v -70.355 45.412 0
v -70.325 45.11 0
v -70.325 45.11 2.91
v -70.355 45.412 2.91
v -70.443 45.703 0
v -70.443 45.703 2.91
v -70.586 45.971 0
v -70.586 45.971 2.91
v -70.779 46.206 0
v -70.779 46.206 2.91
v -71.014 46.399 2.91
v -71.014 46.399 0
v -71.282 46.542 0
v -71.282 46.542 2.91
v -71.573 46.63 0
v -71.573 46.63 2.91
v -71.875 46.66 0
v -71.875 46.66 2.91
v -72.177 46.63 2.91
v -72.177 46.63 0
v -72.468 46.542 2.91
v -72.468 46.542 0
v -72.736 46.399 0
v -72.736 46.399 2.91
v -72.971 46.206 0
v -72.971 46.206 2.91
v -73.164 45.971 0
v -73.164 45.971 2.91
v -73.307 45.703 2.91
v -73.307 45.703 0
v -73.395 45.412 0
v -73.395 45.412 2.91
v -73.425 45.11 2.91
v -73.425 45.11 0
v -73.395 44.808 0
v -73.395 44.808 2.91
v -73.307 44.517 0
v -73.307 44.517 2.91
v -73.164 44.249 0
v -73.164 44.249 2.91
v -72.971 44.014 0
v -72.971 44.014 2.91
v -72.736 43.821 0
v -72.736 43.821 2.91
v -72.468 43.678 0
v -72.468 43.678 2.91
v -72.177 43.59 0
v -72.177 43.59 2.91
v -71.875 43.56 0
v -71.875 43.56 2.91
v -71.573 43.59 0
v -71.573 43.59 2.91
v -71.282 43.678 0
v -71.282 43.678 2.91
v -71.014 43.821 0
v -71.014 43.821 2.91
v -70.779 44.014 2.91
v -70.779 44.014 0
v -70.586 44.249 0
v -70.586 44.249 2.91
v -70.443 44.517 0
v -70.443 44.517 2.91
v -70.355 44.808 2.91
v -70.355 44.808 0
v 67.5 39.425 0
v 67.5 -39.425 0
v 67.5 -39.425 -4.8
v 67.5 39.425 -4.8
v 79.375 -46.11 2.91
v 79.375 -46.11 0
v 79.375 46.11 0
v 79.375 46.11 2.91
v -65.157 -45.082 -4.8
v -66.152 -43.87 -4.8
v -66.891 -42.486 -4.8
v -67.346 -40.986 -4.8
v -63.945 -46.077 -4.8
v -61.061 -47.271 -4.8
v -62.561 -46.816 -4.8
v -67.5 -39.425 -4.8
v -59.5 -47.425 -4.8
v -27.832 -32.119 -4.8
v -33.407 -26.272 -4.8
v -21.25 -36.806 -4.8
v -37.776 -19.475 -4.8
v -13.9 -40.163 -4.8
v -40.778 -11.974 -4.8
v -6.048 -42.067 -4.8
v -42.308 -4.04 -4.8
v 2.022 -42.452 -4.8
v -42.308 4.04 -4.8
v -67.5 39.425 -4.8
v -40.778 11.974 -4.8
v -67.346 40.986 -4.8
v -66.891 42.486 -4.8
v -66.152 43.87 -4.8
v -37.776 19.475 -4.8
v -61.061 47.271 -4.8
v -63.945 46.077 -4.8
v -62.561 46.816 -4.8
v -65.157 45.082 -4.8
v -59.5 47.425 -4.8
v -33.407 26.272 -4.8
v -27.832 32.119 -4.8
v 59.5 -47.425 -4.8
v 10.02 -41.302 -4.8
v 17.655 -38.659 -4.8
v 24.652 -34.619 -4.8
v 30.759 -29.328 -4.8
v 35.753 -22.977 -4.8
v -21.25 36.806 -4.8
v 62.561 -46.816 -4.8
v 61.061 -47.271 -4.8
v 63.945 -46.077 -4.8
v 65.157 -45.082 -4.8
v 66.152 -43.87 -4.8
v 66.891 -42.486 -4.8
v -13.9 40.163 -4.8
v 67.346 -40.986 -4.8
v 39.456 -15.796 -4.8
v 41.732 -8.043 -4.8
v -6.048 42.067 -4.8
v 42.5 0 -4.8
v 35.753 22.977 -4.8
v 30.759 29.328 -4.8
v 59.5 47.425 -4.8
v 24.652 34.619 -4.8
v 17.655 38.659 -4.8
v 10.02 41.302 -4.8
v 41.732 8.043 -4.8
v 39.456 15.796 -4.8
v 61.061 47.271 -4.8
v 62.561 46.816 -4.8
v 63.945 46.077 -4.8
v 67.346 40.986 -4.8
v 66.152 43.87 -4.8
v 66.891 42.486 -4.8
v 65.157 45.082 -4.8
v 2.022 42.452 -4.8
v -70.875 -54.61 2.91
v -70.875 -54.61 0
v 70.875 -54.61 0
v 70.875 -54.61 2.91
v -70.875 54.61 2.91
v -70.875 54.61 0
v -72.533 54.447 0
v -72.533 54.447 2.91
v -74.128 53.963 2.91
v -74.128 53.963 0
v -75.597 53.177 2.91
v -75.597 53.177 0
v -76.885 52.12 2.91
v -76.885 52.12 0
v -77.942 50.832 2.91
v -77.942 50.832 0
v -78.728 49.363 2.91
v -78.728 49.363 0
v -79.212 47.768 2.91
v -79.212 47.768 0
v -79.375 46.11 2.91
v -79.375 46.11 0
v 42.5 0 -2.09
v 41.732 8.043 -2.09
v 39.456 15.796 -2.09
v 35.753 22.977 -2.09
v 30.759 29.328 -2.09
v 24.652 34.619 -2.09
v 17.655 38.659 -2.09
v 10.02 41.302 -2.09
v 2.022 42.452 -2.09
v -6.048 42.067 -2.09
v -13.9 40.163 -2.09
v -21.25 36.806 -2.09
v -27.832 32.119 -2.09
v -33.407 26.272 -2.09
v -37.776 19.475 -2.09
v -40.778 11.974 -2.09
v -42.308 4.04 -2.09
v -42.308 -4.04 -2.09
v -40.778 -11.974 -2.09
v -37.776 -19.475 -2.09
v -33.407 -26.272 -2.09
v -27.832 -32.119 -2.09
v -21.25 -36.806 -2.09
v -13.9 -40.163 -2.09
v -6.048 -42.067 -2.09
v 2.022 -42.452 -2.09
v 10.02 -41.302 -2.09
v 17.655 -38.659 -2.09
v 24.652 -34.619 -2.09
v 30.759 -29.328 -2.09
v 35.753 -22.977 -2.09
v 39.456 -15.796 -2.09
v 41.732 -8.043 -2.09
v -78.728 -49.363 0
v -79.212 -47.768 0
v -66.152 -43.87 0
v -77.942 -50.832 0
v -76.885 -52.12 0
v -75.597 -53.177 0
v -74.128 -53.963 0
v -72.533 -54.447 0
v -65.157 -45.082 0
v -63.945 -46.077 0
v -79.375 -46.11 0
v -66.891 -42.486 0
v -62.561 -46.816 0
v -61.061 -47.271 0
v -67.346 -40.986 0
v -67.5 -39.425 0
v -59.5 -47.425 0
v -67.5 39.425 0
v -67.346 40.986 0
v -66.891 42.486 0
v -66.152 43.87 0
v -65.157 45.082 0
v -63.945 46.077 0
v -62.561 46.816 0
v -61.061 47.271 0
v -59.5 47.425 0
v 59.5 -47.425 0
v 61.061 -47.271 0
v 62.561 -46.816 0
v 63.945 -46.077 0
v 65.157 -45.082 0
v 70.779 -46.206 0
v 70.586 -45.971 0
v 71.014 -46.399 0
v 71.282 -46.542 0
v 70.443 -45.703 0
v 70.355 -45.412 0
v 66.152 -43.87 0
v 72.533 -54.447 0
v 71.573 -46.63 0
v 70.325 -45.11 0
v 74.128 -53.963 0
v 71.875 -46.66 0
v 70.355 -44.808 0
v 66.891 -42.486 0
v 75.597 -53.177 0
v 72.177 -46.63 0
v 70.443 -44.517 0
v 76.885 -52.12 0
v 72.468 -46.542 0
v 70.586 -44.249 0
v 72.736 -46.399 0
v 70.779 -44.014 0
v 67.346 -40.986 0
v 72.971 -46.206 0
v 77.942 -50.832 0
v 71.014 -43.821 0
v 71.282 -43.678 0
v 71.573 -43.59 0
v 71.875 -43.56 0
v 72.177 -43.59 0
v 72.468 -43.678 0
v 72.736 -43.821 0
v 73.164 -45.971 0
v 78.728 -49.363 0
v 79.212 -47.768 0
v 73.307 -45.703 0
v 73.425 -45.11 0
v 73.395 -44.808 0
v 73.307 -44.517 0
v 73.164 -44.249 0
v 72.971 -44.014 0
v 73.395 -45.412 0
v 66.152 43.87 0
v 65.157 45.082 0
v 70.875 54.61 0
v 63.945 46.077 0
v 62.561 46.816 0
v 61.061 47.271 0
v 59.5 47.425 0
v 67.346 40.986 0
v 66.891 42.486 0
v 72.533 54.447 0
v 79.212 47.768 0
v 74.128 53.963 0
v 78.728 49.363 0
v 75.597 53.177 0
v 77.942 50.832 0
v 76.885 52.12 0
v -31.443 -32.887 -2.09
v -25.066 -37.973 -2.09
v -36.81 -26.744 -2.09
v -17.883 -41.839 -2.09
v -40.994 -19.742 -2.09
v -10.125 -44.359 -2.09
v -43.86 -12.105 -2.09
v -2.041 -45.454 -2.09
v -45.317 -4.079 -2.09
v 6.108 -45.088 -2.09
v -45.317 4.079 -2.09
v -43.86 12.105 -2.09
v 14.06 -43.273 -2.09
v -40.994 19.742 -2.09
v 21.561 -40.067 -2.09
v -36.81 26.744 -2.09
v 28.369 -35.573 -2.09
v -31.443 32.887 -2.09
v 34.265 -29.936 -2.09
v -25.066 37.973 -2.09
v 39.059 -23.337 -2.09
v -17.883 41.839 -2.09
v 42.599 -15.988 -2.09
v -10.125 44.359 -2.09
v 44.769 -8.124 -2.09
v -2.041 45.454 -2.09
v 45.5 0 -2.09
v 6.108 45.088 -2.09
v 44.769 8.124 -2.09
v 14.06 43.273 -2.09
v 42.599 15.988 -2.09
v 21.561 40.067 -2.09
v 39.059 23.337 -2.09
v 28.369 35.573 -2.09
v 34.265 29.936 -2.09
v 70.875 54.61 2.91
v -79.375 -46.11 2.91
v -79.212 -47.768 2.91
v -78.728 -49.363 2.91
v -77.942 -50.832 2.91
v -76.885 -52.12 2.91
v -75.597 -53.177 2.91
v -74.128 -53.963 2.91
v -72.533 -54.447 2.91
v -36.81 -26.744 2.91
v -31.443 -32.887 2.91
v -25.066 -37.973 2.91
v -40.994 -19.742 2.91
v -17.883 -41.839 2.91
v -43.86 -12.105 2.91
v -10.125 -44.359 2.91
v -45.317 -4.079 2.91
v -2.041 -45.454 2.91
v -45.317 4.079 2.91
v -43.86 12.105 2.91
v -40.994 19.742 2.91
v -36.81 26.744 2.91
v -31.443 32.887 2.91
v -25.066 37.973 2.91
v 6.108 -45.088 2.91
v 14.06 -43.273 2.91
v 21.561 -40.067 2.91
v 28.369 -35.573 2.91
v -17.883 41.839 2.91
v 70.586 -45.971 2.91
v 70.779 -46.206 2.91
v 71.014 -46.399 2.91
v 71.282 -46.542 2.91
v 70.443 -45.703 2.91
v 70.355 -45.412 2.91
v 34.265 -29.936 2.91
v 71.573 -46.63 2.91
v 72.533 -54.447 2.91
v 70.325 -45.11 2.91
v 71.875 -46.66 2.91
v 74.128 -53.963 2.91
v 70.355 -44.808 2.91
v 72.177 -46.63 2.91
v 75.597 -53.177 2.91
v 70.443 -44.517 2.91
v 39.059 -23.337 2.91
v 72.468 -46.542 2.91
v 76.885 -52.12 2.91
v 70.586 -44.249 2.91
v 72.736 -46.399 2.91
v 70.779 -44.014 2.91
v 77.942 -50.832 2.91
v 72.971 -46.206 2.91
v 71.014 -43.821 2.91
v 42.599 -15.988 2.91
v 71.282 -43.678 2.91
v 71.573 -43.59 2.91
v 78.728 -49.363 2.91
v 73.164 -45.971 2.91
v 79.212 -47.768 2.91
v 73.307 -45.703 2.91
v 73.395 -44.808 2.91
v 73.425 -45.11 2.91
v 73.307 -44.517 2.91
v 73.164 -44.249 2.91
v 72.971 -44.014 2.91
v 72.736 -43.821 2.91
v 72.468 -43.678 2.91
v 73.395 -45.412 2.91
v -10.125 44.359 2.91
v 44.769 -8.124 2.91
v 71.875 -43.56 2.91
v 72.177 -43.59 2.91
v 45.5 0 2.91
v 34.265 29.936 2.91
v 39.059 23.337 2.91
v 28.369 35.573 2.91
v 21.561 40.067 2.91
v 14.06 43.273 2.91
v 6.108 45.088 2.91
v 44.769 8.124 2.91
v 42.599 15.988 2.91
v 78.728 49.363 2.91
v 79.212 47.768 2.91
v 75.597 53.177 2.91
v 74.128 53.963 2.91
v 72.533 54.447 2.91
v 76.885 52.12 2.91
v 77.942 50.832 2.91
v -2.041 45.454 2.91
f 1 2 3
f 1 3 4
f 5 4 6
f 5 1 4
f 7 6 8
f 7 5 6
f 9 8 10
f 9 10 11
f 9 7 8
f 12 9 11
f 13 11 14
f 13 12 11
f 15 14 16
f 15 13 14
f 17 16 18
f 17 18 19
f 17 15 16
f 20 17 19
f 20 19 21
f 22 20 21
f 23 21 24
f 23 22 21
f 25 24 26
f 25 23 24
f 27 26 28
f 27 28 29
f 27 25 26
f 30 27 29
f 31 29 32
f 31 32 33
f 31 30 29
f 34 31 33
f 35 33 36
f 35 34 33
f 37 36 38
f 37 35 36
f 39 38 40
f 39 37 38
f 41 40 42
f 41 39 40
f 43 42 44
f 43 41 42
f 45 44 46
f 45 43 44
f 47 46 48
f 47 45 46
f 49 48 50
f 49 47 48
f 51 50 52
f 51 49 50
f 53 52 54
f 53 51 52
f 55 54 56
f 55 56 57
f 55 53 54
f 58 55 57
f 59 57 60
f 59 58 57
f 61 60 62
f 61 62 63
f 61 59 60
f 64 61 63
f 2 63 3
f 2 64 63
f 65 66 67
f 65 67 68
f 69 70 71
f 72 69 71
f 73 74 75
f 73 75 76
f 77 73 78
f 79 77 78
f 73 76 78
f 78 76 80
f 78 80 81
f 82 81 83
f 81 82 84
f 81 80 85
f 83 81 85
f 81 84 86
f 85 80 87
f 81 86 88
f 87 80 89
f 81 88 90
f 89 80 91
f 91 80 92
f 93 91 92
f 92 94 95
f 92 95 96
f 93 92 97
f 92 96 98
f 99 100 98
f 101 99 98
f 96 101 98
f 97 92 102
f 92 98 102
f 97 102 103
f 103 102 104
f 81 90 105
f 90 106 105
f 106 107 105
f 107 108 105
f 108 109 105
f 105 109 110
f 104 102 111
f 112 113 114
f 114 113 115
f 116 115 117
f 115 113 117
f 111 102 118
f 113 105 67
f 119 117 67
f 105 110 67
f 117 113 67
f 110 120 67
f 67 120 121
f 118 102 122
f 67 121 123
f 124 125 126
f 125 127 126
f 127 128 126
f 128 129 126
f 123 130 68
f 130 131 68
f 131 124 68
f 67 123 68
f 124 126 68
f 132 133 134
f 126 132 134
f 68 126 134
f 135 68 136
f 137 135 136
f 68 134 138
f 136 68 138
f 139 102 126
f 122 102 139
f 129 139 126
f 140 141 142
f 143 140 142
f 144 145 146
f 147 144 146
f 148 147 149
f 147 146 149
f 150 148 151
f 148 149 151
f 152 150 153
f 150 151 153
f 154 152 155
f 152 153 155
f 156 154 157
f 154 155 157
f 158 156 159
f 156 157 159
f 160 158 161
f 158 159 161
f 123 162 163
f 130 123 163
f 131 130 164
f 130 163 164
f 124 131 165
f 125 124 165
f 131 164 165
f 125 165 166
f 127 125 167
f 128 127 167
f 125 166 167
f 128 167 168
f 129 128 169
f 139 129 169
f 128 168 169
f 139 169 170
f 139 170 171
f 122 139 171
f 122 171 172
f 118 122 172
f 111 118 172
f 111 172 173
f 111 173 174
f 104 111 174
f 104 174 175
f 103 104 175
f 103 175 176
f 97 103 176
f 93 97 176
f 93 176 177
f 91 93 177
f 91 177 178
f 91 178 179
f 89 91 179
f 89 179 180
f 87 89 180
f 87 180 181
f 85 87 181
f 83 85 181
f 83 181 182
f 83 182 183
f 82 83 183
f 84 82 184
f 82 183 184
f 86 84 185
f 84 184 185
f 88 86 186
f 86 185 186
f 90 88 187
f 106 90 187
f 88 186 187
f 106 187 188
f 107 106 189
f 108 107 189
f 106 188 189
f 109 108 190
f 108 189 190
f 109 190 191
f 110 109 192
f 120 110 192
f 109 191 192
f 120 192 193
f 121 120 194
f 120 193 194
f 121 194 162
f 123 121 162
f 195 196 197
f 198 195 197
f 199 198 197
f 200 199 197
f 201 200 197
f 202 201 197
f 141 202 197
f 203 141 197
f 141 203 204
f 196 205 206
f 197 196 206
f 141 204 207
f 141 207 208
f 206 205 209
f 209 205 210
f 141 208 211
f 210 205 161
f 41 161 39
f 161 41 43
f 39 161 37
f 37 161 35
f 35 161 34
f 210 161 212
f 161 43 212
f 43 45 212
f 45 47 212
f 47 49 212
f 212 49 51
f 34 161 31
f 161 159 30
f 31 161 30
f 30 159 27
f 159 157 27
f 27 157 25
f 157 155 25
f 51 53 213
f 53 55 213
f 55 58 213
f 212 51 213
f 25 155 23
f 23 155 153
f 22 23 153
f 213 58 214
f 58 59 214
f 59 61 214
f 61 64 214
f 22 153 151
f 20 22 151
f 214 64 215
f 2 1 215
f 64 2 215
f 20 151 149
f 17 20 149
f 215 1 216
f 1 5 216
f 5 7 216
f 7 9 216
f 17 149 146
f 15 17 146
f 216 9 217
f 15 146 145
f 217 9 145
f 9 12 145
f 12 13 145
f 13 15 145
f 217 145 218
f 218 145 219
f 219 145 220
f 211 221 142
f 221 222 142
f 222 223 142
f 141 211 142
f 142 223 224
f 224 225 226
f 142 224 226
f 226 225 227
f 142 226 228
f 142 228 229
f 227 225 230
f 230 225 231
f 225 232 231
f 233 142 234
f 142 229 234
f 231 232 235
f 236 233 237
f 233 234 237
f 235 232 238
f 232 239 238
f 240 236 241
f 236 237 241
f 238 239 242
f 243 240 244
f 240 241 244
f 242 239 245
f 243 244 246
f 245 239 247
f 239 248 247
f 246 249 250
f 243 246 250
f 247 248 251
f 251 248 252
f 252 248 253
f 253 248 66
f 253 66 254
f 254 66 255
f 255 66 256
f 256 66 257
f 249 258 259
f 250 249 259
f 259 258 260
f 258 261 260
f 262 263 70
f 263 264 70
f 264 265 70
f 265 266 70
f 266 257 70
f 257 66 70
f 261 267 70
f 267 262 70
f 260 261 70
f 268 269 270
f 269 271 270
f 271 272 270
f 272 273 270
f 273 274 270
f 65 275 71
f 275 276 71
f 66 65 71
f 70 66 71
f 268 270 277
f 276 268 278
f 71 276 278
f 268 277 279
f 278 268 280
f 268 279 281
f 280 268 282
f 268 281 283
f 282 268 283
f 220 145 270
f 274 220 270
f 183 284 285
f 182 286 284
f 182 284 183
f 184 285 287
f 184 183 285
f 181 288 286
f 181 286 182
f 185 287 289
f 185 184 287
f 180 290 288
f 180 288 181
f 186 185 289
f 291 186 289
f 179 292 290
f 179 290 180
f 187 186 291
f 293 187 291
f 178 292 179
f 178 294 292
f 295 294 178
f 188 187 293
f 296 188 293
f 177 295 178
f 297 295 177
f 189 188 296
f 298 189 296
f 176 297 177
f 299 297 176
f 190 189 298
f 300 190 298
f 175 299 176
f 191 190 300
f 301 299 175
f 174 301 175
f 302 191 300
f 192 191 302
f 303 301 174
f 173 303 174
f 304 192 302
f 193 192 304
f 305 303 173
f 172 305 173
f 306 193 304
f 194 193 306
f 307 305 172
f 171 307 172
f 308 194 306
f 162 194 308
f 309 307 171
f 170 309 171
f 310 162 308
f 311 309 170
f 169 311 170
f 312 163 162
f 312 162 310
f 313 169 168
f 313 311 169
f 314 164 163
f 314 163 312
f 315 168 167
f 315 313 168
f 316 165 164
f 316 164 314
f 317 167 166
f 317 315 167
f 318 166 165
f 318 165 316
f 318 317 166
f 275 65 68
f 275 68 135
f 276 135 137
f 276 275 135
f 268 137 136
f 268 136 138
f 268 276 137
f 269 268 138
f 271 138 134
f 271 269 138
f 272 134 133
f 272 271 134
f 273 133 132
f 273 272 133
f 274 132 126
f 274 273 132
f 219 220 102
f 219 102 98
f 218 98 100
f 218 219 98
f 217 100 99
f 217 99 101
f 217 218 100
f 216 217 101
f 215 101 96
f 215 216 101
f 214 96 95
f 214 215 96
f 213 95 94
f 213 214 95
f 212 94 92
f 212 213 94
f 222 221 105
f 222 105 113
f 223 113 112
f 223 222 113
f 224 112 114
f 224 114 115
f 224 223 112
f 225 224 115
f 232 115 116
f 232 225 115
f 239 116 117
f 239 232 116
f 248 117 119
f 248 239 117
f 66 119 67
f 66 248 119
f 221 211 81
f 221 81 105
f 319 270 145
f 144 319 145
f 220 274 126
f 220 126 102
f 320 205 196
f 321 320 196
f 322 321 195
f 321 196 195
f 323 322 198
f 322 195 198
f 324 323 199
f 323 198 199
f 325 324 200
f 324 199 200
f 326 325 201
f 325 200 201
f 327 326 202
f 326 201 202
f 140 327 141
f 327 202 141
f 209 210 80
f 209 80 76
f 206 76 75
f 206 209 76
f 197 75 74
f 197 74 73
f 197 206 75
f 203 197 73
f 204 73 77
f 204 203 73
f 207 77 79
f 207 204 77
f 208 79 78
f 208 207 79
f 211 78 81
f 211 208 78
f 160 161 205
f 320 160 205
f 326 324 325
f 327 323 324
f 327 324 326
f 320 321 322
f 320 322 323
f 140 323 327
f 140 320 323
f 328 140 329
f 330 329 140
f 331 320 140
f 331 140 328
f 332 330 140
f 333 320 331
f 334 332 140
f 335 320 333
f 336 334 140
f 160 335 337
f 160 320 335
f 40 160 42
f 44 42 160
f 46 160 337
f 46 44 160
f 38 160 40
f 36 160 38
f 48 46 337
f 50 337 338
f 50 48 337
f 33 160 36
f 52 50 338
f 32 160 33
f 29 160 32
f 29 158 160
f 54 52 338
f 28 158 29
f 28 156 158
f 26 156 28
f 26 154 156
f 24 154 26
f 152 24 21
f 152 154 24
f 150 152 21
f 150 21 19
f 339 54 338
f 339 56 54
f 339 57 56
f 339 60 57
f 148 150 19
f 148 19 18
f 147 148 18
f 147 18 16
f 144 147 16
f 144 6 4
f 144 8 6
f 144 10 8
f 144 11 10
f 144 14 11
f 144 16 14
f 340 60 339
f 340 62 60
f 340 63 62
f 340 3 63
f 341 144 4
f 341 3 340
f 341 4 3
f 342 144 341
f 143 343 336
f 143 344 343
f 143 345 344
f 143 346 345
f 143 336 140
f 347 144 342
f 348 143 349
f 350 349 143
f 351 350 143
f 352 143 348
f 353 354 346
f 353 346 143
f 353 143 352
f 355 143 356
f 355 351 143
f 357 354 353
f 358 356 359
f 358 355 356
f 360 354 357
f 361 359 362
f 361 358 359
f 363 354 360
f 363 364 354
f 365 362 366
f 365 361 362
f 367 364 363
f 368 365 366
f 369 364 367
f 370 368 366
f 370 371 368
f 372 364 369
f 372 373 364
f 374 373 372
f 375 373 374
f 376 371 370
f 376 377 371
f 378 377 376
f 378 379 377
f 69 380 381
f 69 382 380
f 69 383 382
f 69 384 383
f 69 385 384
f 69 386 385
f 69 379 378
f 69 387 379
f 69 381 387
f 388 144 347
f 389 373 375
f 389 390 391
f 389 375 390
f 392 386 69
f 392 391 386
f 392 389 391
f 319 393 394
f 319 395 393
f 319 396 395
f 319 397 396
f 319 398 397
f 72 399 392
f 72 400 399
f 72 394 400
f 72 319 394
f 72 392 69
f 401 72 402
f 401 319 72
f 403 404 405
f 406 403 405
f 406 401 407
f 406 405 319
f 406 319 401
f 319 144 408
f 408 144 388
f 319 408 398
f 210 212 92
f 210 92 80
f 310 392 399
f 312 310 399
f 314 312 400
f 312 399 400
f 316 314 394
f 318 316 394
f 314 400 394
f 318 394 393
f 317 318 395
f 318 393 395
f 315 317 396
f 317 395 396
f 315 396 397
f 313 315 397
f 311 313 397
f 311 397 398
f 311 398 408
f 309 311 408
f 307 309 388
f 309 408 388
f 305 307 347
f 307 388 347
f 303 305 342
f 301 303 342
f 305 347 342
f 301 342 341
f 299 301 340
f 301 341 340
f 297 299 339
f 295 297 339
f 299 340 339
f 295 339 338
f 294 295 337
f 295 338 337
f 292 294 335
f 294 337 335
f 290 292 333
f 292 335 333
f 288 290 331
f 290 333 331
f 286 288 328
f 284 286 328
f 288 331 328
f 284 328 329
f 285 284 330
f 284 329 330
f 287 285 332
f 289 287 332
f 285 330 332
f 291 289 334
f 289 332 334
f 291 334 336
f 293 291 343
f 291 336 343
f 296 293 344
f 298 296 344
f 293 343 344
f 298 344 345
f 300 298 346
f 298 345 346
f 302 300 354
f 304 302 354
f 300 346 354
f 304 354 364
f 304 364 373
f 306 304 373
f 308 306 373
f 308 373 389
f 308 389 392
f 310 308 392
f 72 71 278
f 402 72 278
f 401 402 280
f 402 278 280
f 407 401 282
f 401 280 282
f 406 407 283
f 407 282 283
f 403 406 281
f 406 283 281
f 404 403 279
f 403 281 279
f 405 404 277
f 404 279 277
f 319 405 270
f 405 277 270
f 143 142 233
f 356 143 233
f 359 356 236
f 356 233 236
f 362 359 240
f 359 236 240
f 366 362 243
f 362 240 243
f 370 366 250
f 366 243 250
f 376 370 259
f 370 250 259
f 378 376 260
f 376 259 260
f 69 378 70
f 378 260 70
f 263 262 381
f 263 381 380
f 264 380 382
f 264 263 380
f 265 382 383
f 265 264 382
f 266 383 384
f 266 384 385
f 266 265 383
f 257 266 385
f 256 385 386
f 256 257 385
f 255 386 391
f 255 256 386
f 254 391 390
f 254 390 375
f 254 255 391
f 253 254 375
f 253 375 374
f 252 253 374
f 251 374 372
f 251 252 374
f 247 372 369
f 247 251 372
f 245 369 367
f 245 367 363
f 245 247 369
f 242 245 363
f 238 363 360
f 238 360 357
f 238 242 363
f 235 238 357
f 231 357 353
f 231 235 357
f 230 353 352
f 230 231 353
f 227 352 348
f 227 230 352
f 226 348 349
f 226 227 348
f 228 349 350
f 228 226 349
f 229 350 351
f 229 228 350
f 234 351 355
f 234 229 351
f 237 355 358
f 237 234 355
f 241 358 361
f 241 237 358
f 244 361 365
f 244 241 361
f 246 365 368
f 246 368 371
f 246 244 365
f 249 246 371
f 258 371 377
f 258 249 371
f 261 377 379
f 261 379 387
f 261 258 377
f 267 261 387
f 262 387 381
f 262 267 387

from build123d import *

# Parameters (mm, degrees)
F0_R     = 1.55
F1_DEPTH = 2.91
F3_DEPTH = 4.8
F4_R     = 42.5
F5_DEPTH = 25
F4_R_2   = 45.5
F6_DEPTH = 5


with BuildPart() as f1:
    # F0 (on Top) → F1 (new body)
    with BuildSketch(Plane.XY):
        with BuildLine():
            Line((-70.875, -54.61), (70.875, -54.61))
            ThreePointArc((70.875, -54.61), (76.885408, -52.120408), (79.375, -46.11))
            Line((79.375, -46.11), (79.375, 46.11))
            ThreePointArc((79.375, 46.11), (76.885408, 52.120408), (70.875, 54.61))
            Line((70.875, 54.61), (-70.875, 54.61))
            ThreePointArc((-70.875, 54.61), (-76.885408, 52.120408), (-79.375, 46.11))
            Line((-79.375, 46.11), (-79.375, -46.11))
            ThreePointArc((-79.375, -46.11), (-76.885408, -52.120408), (-70.875, -54.61))
        make_face()
        with Locations((71.875, -45.11)):
            Circle(F0_R, mode=Mode.SUBTRACT)
        with Locations((-71.875, 45.11)):
            Circle(F0_R, mode=Mode.SUBTRACT)
    extrude(amount=F1_DEPTH)

    # F2 (on Top) → F3 (join)
    with BuildSketch(Plane.XY):
        with BuildLine():
            Line((-59.5, -47.425), (59.5, -47.425))
            ThreePointArc((59.5, -47.425), (65.156854, -45.081854), (67.5, -39.425))
            Line((67.5, -39.425), (67.5, 39.425))
            ThreePointArc((67.5, 39.425), (65.156854, 45.081854), (59.5, 47.425))
            Line((59.5, 47.425), (-59.5, 47.425))
            ThreePointArc((-59.5, 47.425), (-65.156854, 45.081854), (-67.5, 39.425))
            Line((-67.5, 39.425), (-67.5, -39.425))
            ThreePointArc((-67.5, -39.425), (-65.156854, -45.081854), (-59.5, -47.425))
        make_face()
    extrude(amount=-F3_DEPTH)

    # F4 (on face) → F5 (cut)
    with BuildSketch(Plane.XY.offset(2.91)):
        Circle(F4_R)
    extrude(amount=-F5_DEPTH, mode=Mode.SUBTRACT)

    # F4 (on face) → F6 (cut)
    with BuildSketch(Plane.XY.offset(2.91)):
        Circle(F4_R_2)
        Circle(F4_R, mode=Mode.SUBTRACT)
    extrude(amount=-F6_DEPTH, mode=Mode.SUBTRACT)


solid = f1.part
